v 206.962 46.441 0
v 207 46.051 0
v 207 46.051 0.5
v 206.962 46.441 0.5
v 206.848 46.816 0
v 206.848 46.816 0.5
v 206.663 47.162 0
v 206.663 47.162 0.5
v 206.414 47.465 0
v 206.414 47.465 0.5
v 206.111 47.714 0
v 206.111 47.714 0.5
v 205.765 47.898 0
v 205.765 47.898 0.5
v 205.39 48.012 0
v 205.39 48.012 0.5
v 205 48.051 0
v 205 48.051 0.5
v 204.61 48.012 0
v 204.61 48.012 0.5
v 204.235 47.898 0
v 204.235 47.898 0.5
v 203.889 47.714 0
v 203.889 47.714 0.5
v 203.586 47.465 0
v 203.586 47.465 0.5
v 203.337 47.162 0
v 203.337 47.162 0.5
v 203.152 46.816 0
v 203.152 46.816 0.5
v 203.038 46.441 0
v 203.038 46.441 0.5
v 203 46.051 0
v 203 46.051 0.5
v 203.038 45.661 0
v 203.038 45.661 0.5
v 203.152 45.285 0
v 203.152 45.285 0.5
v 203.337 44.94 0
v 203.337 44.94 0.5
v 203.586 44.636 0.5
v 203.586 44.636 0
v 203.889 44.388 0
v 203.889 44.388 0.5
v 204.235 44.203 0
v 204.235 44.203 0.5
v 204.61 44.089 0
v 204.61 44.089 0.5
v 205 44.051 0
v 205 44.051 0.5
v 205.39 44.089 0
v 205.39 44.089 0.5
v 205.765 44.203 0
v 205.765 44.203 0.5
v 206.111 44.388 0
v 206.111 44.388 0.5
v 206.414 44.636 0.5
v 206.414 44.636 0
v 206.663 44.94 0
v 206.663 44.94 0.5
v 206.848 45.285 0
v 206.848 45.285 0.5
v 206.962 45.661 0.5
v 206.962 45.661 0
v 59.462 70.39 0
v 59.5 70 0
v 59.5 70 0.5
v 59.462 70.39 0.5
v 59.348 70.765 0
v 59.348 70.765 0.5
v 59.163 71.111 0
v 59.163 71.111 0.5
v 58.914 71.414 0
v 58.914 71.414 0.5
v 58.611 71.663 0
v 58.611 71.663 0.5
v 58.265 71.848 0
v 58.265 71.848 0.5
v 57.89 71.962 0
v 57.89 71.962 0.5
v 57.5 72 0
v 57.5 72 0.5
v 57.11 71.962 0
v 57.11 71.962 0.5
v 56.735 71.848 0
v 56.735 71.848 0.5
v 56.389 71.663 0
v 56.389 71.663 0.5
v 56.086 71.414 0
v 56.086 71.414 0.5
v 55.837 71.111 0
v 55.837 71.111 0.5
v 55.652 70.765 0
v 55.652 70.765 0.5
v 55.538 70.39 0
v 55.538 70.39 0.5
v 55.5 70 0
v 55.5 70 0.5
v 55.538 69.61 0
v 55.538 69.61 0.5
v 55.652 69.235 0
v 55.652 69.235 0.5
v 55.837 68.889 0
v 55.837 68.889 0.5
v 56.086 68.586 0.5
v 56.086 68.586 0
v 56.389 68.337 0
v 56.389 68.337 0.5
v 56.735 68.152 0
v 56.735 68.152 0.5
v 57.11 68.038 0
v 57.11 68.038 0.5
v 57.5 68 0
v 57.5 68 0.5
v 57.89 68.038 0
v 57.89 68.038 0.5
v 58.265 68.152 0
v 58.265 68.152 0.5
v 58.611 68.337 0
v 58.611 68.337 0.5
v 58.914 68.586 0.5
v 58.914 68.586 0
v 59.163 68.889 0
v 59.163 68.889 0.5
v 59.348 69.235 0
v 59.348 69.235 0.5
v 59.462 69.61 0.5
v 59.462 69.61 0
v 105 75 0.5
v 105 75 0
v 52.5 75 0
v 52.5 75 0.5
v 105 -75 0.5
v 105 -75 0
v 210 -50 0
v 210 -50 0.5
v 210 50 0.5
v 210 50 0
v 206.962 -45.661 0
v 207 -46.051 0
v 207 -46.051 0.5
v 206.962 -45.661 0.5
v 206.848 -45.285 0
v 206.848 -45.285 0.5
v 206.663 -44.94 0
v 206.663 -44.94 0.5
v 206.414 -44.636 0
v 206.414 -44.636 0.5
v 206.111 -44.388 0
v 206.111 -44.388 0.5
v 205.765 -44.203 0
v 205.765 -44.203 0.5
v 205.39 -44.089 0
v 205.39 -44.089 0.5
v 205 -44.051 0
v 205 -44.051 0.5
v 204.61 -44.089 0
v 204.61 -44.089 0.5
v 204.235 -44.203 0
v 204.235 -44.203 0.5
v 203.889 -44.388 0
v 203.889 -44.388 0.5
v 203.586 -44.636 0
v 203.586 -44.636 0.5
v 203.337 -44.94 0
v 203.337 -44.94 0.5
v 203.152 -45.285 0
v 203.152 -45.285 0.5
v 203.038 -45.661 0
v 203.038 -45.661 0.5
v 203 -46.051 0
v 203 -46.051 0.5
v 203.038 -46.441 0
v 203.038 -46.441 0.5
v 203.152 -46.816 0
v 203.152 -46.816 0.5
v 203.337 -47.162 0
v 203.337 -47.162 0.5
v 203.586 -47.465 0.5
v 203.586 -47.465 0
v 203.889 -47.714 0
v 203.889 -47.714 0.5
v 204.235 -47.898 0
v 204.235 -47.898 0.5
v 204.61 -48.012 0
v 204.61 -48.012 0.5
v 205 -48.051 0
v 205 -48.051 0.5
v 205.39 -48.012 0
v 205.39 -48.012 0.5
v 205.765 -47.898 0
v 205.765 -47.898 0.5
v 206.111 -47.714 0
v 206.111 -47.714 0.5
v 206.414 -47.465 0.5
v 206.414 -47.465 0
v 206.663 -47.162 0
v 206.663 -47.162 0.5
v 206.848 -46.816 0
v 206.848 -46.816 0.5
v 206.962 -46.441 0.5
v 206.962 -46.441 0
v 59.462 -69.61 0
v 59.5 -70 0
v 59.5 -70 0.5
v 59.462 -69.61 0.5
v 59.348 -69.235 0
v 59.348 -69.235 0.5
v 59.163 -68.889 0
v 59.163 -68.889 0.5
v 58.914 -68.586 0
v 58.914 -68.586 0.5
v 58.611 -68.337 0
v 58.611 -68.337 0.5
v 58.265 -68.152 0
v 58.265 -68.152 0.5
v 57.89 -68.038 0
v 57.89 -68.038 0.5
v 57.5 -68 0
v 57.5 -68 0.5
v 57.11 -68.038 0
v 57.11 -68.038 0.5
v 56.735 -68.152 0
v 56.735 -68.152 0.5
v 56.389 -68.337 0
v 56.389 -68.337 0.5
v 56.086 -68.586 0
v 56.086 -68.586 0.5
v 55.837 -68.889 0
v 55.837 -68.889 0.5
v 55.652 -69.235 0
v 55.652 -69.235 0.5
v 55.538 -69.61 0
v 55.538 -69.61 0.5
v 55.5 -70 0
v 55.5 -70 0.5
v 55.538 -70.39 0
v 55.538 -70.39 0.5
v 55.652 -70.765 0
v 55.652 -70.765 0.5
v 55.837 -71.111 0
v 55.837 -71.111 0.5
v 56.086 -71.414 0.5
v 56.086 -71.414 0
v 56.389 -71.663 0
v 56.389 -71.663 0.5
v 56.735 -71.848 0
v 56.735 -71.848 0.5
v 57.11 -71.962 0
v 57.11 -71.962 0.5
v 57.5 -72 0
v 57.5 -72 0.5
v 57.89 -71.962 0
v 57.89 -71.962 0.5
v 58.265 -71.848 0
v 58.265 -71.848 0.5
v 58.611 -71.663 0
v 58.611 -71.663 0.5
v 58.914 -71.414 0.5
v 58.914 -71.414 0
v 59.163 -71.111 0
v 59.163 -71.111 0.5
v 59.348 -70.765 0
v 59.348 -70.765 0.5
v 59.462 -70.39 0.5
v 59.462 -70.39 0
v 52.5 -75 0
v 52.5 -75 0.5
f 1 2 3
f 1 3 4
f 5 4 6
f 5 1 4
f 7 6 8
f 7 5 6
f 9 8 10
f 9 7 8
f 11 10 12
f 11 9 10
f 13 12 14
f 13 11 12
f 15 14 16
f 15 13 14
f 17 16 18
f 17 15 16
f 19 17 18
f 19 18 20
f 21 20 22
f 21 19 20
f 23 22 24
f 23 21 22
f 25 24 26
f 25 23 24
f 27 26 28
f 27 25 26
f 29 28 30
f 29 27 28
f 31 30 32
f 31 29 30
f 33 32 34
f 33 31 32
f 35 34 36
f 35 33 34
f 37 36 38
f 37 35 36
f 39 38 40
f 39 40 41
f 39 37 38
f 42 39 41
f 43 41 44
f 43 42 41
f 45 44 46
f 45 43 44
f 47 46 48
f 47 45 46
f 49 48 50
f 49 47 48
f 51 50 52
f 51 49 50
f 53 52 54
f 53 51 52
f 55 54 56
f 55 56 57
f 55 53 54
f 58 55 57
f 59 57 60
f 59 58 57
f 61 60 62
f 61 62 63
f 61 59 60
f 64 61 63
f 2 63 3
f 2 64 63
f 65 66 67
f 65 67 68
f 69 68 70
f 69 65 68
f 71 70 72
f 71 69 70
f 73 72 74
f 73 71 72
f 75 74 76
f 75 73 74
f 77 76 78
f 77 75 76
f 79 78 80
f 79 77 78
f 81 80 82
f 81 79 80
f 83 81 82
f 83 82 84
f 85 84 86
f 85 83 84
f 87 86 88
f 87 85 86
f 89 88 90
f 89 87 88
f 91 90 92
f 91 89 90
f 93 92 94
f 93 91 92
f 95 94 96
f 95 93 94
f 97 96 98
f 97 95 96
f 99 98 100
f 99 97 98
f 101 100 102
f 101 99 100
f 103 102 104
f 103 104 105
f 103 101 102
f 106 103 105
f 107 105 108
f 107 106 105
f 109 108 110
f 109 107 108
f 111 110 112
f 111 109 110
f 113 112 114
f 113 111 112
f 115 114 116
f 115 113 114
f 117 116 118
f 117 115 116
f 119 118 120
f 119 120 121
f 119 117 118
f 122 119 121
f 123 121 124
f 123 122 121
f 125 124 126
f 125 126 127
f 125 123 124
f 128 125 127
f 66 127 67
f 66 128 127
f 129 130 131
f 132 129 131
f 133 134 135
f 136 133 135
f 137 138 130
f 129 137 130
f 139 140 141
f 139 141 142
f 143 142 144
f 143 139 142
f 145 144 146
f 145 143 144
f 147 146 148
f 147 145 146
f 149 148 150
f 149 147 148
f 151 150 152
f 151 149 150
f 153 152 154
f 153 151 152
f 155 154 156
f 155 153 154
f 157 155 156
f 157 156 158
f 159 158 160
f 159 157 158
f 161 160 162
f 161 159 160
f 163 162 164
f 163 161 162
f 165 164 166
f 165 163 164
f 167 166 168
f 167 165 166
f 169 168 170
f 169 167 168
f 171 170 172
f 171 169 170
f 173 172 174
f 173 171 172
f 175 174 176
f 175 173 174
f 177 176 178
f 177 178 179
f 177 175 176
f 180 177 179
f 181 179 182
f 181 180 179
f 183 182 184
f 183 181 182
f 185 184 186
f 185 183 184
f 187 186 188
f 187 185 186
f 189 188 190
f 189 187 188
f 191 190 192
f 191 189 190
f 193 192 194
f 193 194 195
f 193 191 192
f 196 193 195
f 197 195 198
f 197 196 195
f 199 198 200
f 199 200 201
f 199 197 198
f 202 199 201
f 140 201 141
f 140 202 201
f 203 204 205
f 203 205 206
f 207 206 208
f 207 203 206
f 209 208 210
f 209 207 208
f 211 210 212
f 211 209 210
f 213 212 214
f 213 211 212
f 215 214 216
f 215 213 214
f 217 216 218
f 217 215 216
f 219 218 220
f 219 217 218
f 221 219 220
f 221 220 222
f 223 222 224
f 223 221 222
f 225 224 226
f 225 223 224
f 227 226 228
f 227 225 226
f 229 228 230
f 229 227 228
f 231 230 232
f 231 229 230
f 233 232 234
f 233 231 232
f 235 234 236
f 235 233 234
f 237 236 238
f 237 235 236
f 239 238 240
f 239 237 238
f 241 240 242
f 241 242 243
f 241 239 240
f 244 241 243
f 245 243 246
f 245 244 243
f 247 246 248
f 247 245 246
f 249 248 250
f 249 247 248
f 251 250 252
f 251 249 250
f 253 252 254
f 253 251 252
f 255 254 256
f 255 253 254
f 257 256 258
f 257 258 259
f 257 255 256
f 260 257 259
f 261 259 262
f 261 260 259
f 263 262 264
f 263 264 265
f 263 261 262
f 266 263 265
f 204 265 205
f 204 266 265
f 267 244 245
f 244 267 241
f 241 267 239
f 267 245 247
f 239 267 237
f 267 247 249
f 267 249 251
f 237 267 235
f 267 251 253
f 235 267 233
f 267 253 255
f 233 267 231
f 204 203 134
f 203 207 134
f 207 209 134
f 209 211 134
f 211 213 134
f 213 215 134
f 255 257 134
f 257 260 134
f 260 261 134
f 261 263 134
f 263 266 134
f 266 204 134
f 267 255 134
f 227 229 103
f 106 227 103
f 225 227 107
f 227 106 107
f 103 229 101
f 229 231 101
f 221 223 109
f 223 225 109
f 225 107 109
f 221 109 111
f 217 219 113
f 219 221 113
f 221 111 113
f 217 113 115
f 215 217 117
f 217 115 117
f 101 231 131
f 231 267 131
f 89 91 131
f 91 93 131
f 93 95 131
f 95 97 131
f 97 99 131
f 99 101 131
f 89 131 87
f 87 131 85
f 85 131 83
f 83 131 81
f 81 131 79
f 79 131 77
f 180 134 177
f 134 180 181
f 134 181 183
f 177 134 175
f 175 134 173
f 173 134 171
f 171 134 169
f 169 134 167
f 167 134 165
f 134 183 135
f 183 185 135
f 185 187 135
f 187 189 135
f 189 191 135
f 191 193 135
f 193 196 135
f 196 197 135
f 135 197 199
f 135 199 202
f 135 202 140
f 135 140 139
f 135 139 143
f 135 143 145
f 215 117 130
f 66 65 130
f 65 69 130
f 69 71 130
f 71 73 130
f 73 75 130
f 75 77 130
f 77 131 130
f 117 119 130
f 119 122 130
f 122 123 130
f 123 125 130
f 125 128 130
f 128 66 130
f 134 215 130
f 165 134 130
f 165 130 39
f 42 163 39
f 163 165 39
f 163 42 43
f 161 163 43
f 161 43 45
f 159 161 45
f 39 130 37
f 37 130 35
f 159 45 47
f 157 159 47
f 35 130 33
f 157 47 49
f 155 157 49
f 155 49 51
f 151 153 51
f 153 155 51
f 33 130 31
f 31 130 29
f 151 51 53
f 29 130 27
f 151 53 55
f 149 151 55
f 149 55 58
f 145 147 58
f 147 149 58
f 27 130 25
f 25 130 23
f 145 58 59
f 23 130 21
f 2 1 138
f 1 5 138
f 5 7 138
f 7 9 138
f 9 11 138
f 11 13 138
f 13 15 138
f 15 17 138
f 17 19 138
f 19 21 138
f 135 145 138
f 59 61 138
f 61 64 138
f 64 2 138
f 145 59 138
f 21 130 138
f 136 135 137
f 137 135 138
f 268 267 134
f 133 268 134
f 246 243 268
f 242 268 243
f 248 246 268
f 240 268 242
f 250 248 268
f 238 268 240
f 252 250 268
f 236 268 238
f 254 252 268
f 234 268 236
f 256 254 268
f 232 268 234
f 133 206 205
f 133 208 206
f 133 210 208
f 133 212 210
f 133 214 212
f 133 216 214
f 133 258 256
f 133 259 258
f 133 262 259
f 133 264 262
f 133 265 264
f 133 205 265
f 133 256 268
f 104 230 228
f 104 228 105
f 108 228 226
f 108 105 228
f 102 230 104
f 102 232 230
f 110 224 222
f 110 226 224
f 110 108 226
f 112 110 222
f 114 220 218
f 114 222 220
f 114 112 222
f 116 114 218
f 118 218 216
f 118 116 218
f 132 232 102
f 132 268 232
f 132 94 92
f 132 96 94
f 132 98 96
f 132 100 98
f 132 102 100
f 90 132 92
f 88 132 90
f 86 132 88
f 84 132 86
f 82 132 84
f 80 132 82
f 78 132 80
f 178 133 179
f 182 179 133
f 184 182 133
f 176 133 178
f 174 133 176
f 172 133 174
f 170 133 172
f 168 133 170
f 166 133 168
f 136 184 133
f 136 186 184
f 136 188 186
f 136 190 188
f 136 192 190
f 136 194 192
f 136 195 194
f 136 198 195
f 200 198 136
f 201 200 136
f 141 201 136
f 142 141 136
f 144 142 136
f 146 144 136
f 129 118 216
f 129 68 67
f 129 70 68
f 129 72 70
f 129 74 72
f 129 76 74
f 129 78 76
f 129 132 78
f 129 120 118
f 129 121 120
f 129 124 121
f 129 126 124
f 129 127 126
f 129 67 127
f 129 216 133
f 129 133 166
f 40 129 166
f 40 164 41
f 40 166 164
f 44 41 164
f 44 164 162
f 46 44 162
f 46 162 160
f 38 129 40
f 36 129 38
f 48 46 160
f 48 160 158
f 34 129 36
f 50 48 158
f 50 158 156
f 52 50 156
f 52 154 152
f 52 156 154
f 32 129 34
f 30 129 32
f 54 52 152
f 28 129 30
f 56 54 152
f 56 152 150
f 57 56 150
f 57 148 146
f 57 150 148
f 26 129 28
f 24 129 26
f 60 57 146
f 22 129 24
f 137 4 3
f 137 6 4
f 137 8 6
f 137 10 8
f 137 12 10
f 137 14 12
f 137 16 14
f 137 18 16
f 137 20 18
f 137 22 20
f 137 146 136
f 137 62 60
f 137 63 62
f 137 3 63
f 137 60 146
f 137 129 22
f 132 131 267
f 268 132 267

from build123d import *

# Parameters (mm, degrees)
ESBO_O1_R                = 2
RESSALTO_EXTRUS_O1_DEPTH = 0.5


with BuildPart() as part:
    # Esboço1 → Ressalto-extrusão1 (new body)
    # profile 1 of 2: a face of its own
    with BuildSketch(Plane.XY):
        Polygon((210, -50), (210, 0), (52.5, 0), (52.5, -75), (105, -75), align=None)
        with Locations((57.5, -70)):
            Circle(ESBO_O1_R, mode=Mode.SUBTRACT)
        with Locations((205, -46.050706394)):
            Circle(ESBO_O1_R, mode=Mode.SUBTRACT)
    # profile 2 of 2: a face of its own
    with BuildSketch(Plane.XY):
        Polygon((210, 0), (210, 50), (105, 75), (52.5, 75), (52.5, 0), align=None)
        with Locations((57.5, 70)):
            Circle(ESBO_O1_R, mode=Mode.SUBTRACT)
        with Locations((205, 46.050706394)):
            Circle(ESBO_O1_R, mode=Mode.SUBTRACT)
    extrude(amount=RESSALTO_EXTRUS_O1_DEPTH)


solid = part.part
